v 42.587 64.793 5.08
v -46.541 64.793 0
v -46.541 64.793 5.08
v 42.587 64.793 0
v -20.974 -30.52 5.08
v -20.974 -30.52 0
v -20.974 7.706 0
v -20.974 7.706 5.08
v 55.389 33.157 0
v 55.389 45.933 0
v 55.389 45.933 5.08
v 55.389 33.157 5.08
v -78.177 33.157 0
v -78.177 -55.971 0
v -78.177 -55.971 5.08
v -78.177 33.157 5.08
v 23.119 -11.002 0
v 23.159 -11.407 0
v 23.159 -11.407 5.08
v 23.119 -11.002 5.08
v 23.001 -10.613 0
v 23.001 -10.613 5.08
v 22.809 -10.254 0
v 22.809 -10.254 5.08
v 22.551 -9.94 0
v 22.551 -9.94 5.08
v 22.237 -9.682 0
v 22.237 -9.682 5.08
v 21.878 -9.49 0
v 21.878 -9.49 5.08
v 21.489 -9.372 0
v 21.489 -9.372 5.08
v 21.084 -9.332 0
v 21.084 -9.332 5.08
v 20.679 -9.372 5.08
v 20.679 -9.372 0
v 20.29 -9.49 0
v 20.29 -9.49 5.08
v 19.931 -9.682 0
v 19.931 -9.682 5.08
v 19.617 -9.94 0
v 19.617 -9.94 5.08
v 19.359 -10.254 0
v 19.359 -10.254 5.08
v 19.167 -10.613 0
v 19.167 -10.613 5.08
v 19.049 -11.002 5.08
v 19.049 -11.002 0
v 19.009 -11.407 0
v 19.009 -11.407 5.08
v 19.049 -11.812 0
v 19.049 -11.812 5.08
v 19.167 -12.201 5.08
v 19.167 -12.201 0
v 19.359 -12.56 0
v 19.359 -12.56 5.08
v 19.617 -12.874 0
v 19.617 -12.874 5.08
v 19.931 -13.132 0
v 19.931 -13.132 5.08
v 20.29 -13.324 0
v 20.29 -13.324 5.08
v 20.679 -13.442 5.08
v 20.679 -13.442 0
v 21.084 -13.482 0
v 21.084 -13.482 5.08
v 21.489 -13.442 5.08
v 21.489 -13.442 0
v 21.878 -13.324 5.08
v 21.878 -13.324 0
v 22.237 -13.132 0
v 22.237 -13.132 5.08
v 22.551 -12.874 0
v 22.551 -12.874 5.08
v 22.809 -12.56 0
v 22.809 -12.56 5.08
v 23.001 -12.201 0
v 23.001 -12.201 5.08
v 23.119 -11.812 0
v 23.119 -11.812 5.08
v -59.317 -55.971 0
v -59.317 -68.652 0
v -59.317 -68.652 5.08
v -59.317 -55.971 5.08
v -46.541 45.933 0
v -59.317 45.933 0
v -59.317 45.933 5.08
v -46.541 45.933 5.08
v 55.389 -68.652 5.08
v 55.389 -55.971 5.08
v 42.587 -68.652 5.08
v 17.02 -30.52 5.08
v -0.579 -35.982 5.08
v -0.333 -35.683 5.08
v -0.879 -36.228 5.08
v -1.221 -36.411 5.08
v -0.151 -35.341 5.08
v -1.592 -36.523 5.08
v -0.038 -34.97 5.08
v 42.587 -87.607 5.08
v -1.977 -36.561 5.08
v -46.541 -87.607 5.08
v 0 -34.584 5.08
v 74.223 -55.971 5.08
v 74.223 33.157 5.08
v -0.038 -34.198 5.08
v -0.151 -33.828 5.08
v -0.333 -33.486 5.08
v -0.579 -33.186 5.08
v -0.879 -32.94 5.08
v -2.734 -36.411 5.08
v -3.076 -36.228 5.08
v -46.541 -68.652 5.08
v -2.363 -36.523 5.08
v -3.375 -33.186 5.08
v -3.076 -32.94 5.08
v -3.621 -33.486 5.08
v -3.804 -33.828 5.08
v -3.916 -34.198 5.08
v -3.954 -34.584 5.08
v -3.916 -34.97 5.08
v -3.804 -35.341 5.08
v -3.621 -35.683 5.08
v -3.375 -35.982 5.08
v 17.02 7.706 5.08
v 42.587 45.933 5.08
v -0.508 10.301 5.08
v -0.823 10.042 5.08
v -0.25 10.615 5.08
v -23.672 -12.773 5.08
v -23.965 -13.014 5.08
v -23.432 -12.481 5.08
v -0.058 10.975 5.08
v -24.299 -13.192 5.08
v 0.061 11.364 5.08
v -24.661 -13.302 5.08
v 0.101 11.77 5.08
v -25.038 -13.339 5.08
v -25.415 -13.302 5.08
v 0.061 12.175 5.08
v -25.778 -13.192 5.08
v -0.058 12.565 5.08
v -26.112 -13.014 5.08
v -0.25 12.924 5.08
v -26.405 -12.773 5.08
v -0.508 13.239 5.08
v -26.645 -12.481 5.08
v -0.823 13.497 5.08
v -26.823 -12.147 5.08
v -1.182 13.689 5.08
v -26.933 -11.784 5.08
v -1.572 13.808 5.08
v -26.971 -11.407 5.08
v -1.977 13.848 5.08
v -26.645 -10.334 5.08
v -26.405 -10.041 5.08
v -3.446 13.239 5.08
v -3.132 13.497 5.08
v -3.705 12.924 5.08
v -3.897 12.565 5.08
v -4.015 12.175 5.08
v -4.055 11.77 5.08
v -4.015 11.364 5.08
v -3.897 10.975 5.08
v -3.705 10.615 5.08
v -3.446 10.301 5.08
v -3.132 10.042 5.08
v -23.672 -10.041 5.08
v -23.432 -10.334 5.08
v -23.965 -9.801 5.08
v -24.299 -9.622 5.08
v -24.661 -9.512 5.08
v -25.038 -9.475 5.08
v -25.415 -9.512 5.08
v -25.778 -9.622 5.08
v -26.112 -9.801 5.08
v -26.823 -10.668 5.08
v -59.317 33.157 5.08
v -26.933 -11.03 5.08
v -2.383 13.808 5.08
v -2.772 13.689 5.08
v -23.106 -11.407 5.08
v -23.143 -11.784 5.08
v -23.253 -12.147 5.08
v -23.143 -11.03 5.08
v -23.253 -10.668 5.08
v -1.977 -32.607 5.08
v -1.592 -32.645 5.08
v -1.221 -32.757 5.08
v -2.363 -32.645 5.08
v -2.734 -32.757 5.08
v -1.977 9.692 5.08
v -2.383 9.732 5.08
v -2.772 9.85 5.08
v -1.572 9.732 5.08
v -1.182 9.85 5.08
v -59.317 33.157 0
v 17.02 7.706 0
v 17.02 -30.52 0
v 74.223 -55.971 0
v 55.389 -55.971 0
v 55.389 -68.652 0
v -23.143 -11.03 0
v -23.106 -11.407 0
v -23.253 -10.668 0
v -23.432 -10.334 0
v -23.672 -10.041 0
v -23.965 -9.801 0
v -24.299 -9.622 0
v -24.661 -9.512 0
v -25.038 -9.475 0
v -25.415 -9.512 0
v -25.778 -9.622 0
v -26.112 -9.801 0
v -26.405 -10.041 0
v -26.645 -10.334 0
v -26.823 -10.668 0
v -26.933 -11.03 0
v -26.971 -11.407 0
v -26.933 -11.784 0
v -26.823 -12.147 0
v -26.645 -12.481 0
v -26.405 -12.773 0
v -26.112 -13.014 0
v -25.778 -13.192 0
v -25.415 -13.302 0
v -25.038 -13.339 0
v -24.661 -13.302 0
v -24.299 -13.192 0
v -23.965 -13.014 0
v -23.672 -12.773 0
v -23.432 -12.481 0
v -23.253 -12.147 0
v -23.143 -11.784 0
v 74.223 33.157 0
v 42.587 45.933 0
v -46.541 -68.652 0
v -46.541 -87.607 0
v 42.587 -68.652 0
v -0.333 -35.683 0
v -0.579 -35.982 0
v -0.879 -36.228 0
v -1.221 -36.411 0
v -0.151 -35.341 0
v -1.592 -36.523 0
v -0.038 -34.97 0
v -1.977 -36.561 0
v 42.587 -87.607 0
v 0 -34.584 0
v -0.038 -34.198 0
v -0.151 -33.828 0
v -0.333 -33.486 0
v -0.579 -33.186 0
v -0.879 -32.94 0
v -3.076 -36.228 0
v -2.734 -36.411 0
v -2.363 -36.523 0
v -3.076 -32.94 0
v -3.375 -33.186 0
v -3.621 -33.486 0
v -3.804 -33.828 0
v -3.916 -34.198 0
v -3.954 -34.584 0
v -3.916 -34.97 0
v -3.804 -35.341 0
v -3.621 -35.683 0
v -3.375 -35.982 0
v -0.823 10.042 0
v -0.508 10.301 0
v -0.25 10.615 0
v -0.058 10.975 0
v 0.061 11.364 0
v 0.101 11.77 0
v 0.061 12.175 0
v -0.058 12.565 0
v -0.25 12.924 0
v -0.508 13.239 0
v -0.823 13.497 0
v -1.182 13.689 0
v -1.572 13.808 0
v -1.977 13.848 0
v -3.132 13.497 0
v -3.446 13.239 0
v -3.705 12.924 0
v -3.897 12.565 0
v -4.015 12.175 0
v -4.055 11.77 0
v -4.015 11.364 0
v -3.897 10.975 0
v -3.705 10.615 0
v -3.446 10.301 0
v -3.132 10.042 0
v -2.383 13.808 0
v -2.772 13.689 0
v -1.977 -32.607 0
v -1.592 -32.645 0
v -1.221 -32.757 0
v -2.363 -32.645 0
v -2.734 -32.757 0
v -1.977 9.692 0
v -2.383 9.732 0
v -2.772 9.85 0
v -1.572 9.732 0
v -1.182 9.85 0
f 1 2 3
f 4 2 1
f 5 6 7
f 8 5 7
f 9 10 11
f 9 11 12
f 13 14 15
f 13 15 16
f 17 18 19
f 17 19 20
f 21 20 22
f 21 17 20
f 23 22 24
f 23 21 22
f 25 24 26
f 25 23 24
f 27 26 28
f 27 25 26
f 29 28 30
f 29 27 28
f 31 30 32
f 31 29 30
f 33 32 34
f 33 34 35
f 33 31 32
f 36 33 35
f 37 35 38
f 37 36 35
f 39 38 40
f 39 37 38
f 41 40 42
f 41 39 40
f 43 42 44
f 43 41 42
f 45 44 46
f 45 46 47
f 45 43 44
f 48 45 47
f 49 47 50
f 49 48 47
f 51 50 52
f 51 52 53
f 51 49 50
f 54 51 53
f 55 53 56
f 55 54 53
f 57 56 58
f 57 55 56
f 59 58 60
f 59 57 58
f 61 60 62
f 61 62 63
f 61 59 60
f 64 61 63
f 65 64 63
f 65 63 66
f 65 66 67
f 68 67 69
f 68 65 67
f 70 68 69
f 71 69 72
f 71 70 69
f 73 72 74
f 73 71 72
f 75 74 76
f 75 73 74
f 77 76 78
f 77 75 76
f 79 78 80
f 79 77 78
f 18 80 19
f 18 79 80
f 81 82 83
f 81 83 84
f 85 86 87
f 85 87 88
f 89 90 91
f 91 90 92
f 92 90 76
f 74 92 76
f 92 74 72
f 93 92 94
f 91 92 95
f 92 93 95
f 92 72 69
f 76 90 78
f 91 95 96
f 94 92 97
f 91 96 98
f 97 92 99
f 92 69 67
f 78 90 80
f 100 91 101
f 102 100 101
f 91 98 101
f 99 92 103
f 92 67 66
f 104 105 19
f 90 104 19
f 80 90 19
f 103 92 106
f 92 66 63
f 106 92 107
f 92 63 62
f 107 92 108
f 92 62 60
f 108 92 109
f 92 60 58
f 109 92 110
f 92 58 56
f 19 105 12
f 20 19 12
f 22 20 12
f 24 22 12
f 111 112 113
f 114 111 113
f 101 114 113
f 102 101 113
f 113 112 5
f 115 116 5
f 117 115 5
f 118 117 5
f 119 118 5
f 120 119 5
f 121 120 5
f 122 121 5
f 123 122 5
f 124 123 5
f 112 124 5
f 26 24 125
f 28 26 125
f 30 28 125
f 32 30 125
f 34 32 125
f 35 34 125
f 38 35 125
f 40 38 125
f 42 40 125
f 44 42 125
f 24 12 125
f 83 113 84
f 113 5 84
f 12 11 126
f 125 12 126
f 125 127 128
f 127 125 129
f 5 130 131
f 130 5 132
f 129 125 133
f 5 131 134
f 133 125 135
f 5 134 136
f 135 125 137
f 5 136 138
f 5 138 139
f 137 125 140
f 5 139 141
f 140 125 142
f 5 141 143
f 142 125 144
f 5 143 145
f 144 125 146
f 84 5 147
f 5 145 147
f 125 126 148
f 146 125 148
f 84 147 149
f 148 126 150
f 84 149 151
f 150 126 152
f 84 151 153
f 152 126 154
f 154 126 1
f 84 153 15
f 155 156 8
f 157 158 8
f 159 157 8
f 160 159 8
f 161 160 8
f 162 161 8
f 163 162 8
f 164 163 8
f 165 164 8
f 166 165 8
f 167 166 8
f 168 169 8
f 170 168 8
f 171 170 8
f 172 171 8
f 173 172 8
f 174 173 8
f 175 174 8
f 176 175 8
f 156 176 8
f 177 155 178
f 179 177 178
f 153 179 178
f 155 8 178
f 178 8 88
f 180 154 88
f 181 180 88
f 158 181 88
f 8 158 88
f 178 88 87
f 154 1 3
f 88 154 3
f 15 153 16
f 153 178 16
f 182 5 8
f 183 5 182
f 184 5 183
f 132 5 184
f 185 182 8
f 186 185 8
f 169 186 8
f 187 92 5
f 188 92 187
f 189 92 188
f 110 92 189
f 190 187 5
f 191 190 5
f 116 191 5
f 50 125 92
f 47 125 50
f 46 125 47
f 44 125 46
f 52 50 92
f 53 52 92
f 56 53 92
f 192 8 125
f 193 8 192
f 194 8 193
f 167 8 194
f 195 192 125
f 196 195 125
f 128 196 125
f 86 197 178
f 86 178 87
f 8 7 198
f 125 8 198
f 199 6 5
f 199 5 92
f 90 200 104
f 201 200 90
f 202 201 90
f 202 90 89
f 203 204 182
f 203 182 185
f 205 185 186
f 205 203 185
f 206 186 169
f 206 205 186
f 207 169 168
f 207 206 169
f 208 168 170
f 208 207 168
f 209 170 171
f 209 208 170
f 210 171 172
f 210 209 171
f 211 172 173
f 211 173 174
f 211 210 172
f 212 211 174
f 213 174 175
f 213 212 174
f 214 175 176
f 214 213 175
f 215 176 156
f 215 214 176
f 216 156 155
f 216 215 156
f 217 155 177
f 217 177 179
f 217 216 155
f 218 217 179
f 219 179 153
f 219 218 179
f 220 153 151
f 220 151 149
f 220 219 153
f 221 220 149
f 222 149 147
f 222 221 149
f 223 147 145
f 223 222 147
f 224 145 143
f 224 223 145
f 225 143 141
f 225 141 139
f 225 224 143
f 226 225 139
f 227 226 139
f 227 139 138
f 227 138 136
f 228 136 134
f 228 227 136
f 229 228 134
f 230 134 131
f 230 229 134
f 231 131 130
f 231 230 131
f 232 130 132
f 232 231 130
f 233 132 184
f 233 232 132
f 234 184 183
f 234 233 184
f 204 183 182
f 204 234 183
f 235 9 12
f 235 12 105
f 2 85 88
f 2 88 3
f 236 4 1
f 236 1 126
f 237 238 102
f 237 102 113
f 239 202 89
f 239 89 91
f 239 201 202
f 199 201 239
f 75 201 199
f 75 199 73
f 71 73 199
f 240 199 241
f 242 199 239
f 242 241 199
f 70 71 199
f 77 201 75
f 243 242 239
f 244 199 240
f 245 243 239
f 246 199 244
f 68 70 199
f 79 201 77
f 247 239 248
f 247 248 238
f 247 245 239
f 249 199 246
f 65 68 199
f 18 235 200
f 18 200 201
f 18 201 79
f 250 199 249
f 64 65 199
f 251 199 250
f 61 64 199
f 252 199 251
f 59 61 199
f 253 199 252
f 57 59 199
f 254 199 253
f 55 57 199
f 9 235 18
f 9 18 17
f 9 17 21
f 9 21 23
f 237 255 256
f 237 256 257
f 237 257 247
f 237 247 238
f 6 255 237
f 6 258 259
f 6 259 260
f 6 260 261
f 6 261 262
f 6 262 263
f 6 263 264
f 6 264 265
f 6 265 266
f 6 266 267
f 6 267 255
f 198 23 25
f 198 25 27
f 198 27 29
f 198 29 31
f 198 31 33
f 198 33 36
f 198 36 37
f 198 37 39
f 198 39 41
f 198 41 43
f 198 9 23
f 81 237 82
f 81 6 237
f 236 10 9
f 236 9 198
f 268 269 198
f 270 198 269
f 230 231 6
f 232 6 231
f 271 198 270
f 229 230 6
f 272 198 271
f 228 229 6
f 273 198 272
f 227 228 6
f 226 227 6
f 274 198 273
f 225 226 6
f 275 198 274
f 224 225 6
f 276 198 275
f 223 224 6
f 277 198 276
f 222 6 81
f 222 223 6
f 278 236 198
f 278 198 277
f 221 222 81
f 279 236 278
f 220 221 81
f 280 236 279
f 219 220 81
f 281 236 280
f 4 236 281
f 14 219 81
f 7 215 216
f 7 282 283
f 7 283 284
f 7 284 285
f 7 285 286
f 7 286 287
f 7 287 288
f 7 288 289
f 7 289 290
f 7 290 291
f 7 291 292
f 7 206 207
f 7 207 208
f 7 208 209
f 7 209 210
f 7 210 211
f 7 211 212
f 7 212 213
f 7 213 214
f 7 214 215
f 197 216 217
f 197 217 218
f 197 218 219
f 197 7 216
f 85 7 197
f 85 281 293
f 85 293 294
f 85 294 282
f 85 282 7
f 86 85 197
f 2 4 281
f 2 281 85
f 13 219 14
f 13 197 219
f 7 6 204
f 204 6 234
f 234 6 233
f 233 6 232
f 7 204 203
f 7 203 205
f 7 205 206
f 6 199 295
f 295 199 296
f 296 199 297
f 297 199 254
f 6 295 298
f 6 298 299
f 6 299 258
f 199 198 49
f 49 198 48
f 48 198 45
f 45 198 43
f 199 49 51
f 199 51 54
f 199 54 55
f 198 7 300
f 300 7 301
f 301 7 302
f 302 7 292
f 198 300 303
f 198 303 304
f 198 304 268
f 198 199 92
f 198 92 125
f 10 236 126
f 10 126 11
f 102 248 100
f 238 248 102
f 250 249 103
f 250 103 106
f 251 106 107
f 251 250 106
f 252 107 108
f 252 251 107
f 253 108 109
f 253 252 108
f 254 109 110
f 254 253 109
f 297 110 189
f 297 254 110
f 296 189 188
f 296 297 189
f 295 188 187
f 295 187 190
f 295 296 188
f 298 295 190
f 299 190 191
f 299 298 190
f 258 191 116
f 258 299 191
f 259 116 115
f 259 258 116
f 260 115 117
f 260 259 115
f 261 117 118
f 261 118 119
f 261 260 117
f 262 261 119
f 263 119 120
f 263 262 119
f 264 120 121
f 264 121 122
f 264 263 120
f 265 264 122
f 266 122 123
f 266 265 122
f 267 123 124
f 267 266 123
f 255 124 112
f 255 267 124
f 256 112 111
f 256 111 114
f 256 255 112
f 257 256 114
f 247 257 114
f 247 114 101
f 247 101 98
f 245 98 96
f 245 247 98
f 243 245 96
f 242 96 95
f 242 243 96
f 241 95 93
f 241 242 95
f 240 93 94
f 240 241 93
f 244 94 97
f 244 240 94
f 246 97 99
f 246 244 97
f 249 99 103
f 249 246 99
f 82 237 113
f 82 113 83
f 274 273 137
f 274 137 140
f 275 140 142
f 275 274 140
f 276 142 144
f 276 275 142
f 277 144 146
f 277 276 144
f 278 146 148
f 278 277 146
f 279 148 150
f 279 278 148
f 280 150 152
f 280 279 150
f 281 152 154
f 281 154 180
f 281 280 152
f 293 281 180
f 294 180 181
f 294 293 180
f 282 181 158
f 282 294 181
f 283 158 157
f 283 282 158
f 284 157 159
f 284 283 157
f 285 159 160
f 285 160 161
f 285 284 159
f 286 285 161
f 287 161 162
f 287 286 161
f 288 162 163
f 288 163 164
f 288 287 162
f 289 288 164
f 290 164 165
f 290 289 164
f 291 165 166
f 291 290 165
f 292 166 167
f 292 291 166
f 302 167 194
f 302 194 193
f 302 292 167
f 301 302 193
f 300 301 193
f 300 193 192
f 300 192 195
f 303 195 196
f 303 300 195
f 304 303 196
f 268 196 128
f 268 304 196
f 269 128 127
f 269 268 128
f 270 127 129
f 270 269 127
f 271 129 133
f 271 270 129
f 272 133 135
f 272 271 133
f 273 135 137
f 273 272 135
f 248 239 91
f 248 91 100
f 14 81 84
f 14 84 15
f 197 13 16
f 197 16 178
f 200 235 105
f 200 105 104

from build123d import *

# Parameters (mm, degrees)
SKETCH1_R           = 1.932130595
SKETCH1_R_2         = 2.077751344
SKETCH1_R_3         = 2.074790544
SKETCH1_R_4         = 1.977245509
SKETCH1_W           = 37.994310796
SKETCH1_H           = 38.225983422
BOSS_EXTRUDE1_DEPTH = 5.08


with BuildPart() as part:
    # Sketch1 → Boss-Extrude1 (new body)
    with BuildSketch(Plane.XY):
        Polygon((-46.541317365, 64.792814371), (42.586826347, 64.792814371), (42.586826347, 45.932934132), (55.3889879, 45.932934132), (55.3889879, 33.156886228), (74.222754491, 33.156886228), (74.222754491, -55.971257485), (55.3889879, -55.971257485), (55.3889879, -68.652333238), (42.586826347, -68.652333238), (42.586826347, -87.607185629), (-46.541317365, -87.607185629), (-46.541317365, -68.652333238), (-59.317365269, -68.652333238), (-59.317365269, -55.971257485), (-78.177245509, -55.971257485), (-78.177245509, 33.156886228), (-59.317365269, 33.156886228), (-59.317365269, 45.932934132), (-46.541317365, 45.932934132), align=None)
        with Locations((-25.038400907, -11.407185629)):
            Circle(SKETCH1_R, mode=Mode.SUBTRACT)
        with Locations((-1.977245509, 11.769806082)):
            Circle(SKETCH1_R_2, mode=Mode.SUBTRACT)
        with Locations((21.083909889, -11.407185629)):
            Circle(SKETCH1_R_3, mode=Mode.SUBTRACT)
        with Locations((-1.977245509, -34.58417734)):
            Circle(SKETCH1_R_4, mode=Mode.SUBTRACT)
        with Locations((-1.977245509, -11.407185629)):
            Rectangle(SKETCH1_W, SKETCH1_H, mode=Mode.SUBTRACT)
    extrude(amount=BOSS_EXTRUDE1_DEPTH)


solid = part.part
